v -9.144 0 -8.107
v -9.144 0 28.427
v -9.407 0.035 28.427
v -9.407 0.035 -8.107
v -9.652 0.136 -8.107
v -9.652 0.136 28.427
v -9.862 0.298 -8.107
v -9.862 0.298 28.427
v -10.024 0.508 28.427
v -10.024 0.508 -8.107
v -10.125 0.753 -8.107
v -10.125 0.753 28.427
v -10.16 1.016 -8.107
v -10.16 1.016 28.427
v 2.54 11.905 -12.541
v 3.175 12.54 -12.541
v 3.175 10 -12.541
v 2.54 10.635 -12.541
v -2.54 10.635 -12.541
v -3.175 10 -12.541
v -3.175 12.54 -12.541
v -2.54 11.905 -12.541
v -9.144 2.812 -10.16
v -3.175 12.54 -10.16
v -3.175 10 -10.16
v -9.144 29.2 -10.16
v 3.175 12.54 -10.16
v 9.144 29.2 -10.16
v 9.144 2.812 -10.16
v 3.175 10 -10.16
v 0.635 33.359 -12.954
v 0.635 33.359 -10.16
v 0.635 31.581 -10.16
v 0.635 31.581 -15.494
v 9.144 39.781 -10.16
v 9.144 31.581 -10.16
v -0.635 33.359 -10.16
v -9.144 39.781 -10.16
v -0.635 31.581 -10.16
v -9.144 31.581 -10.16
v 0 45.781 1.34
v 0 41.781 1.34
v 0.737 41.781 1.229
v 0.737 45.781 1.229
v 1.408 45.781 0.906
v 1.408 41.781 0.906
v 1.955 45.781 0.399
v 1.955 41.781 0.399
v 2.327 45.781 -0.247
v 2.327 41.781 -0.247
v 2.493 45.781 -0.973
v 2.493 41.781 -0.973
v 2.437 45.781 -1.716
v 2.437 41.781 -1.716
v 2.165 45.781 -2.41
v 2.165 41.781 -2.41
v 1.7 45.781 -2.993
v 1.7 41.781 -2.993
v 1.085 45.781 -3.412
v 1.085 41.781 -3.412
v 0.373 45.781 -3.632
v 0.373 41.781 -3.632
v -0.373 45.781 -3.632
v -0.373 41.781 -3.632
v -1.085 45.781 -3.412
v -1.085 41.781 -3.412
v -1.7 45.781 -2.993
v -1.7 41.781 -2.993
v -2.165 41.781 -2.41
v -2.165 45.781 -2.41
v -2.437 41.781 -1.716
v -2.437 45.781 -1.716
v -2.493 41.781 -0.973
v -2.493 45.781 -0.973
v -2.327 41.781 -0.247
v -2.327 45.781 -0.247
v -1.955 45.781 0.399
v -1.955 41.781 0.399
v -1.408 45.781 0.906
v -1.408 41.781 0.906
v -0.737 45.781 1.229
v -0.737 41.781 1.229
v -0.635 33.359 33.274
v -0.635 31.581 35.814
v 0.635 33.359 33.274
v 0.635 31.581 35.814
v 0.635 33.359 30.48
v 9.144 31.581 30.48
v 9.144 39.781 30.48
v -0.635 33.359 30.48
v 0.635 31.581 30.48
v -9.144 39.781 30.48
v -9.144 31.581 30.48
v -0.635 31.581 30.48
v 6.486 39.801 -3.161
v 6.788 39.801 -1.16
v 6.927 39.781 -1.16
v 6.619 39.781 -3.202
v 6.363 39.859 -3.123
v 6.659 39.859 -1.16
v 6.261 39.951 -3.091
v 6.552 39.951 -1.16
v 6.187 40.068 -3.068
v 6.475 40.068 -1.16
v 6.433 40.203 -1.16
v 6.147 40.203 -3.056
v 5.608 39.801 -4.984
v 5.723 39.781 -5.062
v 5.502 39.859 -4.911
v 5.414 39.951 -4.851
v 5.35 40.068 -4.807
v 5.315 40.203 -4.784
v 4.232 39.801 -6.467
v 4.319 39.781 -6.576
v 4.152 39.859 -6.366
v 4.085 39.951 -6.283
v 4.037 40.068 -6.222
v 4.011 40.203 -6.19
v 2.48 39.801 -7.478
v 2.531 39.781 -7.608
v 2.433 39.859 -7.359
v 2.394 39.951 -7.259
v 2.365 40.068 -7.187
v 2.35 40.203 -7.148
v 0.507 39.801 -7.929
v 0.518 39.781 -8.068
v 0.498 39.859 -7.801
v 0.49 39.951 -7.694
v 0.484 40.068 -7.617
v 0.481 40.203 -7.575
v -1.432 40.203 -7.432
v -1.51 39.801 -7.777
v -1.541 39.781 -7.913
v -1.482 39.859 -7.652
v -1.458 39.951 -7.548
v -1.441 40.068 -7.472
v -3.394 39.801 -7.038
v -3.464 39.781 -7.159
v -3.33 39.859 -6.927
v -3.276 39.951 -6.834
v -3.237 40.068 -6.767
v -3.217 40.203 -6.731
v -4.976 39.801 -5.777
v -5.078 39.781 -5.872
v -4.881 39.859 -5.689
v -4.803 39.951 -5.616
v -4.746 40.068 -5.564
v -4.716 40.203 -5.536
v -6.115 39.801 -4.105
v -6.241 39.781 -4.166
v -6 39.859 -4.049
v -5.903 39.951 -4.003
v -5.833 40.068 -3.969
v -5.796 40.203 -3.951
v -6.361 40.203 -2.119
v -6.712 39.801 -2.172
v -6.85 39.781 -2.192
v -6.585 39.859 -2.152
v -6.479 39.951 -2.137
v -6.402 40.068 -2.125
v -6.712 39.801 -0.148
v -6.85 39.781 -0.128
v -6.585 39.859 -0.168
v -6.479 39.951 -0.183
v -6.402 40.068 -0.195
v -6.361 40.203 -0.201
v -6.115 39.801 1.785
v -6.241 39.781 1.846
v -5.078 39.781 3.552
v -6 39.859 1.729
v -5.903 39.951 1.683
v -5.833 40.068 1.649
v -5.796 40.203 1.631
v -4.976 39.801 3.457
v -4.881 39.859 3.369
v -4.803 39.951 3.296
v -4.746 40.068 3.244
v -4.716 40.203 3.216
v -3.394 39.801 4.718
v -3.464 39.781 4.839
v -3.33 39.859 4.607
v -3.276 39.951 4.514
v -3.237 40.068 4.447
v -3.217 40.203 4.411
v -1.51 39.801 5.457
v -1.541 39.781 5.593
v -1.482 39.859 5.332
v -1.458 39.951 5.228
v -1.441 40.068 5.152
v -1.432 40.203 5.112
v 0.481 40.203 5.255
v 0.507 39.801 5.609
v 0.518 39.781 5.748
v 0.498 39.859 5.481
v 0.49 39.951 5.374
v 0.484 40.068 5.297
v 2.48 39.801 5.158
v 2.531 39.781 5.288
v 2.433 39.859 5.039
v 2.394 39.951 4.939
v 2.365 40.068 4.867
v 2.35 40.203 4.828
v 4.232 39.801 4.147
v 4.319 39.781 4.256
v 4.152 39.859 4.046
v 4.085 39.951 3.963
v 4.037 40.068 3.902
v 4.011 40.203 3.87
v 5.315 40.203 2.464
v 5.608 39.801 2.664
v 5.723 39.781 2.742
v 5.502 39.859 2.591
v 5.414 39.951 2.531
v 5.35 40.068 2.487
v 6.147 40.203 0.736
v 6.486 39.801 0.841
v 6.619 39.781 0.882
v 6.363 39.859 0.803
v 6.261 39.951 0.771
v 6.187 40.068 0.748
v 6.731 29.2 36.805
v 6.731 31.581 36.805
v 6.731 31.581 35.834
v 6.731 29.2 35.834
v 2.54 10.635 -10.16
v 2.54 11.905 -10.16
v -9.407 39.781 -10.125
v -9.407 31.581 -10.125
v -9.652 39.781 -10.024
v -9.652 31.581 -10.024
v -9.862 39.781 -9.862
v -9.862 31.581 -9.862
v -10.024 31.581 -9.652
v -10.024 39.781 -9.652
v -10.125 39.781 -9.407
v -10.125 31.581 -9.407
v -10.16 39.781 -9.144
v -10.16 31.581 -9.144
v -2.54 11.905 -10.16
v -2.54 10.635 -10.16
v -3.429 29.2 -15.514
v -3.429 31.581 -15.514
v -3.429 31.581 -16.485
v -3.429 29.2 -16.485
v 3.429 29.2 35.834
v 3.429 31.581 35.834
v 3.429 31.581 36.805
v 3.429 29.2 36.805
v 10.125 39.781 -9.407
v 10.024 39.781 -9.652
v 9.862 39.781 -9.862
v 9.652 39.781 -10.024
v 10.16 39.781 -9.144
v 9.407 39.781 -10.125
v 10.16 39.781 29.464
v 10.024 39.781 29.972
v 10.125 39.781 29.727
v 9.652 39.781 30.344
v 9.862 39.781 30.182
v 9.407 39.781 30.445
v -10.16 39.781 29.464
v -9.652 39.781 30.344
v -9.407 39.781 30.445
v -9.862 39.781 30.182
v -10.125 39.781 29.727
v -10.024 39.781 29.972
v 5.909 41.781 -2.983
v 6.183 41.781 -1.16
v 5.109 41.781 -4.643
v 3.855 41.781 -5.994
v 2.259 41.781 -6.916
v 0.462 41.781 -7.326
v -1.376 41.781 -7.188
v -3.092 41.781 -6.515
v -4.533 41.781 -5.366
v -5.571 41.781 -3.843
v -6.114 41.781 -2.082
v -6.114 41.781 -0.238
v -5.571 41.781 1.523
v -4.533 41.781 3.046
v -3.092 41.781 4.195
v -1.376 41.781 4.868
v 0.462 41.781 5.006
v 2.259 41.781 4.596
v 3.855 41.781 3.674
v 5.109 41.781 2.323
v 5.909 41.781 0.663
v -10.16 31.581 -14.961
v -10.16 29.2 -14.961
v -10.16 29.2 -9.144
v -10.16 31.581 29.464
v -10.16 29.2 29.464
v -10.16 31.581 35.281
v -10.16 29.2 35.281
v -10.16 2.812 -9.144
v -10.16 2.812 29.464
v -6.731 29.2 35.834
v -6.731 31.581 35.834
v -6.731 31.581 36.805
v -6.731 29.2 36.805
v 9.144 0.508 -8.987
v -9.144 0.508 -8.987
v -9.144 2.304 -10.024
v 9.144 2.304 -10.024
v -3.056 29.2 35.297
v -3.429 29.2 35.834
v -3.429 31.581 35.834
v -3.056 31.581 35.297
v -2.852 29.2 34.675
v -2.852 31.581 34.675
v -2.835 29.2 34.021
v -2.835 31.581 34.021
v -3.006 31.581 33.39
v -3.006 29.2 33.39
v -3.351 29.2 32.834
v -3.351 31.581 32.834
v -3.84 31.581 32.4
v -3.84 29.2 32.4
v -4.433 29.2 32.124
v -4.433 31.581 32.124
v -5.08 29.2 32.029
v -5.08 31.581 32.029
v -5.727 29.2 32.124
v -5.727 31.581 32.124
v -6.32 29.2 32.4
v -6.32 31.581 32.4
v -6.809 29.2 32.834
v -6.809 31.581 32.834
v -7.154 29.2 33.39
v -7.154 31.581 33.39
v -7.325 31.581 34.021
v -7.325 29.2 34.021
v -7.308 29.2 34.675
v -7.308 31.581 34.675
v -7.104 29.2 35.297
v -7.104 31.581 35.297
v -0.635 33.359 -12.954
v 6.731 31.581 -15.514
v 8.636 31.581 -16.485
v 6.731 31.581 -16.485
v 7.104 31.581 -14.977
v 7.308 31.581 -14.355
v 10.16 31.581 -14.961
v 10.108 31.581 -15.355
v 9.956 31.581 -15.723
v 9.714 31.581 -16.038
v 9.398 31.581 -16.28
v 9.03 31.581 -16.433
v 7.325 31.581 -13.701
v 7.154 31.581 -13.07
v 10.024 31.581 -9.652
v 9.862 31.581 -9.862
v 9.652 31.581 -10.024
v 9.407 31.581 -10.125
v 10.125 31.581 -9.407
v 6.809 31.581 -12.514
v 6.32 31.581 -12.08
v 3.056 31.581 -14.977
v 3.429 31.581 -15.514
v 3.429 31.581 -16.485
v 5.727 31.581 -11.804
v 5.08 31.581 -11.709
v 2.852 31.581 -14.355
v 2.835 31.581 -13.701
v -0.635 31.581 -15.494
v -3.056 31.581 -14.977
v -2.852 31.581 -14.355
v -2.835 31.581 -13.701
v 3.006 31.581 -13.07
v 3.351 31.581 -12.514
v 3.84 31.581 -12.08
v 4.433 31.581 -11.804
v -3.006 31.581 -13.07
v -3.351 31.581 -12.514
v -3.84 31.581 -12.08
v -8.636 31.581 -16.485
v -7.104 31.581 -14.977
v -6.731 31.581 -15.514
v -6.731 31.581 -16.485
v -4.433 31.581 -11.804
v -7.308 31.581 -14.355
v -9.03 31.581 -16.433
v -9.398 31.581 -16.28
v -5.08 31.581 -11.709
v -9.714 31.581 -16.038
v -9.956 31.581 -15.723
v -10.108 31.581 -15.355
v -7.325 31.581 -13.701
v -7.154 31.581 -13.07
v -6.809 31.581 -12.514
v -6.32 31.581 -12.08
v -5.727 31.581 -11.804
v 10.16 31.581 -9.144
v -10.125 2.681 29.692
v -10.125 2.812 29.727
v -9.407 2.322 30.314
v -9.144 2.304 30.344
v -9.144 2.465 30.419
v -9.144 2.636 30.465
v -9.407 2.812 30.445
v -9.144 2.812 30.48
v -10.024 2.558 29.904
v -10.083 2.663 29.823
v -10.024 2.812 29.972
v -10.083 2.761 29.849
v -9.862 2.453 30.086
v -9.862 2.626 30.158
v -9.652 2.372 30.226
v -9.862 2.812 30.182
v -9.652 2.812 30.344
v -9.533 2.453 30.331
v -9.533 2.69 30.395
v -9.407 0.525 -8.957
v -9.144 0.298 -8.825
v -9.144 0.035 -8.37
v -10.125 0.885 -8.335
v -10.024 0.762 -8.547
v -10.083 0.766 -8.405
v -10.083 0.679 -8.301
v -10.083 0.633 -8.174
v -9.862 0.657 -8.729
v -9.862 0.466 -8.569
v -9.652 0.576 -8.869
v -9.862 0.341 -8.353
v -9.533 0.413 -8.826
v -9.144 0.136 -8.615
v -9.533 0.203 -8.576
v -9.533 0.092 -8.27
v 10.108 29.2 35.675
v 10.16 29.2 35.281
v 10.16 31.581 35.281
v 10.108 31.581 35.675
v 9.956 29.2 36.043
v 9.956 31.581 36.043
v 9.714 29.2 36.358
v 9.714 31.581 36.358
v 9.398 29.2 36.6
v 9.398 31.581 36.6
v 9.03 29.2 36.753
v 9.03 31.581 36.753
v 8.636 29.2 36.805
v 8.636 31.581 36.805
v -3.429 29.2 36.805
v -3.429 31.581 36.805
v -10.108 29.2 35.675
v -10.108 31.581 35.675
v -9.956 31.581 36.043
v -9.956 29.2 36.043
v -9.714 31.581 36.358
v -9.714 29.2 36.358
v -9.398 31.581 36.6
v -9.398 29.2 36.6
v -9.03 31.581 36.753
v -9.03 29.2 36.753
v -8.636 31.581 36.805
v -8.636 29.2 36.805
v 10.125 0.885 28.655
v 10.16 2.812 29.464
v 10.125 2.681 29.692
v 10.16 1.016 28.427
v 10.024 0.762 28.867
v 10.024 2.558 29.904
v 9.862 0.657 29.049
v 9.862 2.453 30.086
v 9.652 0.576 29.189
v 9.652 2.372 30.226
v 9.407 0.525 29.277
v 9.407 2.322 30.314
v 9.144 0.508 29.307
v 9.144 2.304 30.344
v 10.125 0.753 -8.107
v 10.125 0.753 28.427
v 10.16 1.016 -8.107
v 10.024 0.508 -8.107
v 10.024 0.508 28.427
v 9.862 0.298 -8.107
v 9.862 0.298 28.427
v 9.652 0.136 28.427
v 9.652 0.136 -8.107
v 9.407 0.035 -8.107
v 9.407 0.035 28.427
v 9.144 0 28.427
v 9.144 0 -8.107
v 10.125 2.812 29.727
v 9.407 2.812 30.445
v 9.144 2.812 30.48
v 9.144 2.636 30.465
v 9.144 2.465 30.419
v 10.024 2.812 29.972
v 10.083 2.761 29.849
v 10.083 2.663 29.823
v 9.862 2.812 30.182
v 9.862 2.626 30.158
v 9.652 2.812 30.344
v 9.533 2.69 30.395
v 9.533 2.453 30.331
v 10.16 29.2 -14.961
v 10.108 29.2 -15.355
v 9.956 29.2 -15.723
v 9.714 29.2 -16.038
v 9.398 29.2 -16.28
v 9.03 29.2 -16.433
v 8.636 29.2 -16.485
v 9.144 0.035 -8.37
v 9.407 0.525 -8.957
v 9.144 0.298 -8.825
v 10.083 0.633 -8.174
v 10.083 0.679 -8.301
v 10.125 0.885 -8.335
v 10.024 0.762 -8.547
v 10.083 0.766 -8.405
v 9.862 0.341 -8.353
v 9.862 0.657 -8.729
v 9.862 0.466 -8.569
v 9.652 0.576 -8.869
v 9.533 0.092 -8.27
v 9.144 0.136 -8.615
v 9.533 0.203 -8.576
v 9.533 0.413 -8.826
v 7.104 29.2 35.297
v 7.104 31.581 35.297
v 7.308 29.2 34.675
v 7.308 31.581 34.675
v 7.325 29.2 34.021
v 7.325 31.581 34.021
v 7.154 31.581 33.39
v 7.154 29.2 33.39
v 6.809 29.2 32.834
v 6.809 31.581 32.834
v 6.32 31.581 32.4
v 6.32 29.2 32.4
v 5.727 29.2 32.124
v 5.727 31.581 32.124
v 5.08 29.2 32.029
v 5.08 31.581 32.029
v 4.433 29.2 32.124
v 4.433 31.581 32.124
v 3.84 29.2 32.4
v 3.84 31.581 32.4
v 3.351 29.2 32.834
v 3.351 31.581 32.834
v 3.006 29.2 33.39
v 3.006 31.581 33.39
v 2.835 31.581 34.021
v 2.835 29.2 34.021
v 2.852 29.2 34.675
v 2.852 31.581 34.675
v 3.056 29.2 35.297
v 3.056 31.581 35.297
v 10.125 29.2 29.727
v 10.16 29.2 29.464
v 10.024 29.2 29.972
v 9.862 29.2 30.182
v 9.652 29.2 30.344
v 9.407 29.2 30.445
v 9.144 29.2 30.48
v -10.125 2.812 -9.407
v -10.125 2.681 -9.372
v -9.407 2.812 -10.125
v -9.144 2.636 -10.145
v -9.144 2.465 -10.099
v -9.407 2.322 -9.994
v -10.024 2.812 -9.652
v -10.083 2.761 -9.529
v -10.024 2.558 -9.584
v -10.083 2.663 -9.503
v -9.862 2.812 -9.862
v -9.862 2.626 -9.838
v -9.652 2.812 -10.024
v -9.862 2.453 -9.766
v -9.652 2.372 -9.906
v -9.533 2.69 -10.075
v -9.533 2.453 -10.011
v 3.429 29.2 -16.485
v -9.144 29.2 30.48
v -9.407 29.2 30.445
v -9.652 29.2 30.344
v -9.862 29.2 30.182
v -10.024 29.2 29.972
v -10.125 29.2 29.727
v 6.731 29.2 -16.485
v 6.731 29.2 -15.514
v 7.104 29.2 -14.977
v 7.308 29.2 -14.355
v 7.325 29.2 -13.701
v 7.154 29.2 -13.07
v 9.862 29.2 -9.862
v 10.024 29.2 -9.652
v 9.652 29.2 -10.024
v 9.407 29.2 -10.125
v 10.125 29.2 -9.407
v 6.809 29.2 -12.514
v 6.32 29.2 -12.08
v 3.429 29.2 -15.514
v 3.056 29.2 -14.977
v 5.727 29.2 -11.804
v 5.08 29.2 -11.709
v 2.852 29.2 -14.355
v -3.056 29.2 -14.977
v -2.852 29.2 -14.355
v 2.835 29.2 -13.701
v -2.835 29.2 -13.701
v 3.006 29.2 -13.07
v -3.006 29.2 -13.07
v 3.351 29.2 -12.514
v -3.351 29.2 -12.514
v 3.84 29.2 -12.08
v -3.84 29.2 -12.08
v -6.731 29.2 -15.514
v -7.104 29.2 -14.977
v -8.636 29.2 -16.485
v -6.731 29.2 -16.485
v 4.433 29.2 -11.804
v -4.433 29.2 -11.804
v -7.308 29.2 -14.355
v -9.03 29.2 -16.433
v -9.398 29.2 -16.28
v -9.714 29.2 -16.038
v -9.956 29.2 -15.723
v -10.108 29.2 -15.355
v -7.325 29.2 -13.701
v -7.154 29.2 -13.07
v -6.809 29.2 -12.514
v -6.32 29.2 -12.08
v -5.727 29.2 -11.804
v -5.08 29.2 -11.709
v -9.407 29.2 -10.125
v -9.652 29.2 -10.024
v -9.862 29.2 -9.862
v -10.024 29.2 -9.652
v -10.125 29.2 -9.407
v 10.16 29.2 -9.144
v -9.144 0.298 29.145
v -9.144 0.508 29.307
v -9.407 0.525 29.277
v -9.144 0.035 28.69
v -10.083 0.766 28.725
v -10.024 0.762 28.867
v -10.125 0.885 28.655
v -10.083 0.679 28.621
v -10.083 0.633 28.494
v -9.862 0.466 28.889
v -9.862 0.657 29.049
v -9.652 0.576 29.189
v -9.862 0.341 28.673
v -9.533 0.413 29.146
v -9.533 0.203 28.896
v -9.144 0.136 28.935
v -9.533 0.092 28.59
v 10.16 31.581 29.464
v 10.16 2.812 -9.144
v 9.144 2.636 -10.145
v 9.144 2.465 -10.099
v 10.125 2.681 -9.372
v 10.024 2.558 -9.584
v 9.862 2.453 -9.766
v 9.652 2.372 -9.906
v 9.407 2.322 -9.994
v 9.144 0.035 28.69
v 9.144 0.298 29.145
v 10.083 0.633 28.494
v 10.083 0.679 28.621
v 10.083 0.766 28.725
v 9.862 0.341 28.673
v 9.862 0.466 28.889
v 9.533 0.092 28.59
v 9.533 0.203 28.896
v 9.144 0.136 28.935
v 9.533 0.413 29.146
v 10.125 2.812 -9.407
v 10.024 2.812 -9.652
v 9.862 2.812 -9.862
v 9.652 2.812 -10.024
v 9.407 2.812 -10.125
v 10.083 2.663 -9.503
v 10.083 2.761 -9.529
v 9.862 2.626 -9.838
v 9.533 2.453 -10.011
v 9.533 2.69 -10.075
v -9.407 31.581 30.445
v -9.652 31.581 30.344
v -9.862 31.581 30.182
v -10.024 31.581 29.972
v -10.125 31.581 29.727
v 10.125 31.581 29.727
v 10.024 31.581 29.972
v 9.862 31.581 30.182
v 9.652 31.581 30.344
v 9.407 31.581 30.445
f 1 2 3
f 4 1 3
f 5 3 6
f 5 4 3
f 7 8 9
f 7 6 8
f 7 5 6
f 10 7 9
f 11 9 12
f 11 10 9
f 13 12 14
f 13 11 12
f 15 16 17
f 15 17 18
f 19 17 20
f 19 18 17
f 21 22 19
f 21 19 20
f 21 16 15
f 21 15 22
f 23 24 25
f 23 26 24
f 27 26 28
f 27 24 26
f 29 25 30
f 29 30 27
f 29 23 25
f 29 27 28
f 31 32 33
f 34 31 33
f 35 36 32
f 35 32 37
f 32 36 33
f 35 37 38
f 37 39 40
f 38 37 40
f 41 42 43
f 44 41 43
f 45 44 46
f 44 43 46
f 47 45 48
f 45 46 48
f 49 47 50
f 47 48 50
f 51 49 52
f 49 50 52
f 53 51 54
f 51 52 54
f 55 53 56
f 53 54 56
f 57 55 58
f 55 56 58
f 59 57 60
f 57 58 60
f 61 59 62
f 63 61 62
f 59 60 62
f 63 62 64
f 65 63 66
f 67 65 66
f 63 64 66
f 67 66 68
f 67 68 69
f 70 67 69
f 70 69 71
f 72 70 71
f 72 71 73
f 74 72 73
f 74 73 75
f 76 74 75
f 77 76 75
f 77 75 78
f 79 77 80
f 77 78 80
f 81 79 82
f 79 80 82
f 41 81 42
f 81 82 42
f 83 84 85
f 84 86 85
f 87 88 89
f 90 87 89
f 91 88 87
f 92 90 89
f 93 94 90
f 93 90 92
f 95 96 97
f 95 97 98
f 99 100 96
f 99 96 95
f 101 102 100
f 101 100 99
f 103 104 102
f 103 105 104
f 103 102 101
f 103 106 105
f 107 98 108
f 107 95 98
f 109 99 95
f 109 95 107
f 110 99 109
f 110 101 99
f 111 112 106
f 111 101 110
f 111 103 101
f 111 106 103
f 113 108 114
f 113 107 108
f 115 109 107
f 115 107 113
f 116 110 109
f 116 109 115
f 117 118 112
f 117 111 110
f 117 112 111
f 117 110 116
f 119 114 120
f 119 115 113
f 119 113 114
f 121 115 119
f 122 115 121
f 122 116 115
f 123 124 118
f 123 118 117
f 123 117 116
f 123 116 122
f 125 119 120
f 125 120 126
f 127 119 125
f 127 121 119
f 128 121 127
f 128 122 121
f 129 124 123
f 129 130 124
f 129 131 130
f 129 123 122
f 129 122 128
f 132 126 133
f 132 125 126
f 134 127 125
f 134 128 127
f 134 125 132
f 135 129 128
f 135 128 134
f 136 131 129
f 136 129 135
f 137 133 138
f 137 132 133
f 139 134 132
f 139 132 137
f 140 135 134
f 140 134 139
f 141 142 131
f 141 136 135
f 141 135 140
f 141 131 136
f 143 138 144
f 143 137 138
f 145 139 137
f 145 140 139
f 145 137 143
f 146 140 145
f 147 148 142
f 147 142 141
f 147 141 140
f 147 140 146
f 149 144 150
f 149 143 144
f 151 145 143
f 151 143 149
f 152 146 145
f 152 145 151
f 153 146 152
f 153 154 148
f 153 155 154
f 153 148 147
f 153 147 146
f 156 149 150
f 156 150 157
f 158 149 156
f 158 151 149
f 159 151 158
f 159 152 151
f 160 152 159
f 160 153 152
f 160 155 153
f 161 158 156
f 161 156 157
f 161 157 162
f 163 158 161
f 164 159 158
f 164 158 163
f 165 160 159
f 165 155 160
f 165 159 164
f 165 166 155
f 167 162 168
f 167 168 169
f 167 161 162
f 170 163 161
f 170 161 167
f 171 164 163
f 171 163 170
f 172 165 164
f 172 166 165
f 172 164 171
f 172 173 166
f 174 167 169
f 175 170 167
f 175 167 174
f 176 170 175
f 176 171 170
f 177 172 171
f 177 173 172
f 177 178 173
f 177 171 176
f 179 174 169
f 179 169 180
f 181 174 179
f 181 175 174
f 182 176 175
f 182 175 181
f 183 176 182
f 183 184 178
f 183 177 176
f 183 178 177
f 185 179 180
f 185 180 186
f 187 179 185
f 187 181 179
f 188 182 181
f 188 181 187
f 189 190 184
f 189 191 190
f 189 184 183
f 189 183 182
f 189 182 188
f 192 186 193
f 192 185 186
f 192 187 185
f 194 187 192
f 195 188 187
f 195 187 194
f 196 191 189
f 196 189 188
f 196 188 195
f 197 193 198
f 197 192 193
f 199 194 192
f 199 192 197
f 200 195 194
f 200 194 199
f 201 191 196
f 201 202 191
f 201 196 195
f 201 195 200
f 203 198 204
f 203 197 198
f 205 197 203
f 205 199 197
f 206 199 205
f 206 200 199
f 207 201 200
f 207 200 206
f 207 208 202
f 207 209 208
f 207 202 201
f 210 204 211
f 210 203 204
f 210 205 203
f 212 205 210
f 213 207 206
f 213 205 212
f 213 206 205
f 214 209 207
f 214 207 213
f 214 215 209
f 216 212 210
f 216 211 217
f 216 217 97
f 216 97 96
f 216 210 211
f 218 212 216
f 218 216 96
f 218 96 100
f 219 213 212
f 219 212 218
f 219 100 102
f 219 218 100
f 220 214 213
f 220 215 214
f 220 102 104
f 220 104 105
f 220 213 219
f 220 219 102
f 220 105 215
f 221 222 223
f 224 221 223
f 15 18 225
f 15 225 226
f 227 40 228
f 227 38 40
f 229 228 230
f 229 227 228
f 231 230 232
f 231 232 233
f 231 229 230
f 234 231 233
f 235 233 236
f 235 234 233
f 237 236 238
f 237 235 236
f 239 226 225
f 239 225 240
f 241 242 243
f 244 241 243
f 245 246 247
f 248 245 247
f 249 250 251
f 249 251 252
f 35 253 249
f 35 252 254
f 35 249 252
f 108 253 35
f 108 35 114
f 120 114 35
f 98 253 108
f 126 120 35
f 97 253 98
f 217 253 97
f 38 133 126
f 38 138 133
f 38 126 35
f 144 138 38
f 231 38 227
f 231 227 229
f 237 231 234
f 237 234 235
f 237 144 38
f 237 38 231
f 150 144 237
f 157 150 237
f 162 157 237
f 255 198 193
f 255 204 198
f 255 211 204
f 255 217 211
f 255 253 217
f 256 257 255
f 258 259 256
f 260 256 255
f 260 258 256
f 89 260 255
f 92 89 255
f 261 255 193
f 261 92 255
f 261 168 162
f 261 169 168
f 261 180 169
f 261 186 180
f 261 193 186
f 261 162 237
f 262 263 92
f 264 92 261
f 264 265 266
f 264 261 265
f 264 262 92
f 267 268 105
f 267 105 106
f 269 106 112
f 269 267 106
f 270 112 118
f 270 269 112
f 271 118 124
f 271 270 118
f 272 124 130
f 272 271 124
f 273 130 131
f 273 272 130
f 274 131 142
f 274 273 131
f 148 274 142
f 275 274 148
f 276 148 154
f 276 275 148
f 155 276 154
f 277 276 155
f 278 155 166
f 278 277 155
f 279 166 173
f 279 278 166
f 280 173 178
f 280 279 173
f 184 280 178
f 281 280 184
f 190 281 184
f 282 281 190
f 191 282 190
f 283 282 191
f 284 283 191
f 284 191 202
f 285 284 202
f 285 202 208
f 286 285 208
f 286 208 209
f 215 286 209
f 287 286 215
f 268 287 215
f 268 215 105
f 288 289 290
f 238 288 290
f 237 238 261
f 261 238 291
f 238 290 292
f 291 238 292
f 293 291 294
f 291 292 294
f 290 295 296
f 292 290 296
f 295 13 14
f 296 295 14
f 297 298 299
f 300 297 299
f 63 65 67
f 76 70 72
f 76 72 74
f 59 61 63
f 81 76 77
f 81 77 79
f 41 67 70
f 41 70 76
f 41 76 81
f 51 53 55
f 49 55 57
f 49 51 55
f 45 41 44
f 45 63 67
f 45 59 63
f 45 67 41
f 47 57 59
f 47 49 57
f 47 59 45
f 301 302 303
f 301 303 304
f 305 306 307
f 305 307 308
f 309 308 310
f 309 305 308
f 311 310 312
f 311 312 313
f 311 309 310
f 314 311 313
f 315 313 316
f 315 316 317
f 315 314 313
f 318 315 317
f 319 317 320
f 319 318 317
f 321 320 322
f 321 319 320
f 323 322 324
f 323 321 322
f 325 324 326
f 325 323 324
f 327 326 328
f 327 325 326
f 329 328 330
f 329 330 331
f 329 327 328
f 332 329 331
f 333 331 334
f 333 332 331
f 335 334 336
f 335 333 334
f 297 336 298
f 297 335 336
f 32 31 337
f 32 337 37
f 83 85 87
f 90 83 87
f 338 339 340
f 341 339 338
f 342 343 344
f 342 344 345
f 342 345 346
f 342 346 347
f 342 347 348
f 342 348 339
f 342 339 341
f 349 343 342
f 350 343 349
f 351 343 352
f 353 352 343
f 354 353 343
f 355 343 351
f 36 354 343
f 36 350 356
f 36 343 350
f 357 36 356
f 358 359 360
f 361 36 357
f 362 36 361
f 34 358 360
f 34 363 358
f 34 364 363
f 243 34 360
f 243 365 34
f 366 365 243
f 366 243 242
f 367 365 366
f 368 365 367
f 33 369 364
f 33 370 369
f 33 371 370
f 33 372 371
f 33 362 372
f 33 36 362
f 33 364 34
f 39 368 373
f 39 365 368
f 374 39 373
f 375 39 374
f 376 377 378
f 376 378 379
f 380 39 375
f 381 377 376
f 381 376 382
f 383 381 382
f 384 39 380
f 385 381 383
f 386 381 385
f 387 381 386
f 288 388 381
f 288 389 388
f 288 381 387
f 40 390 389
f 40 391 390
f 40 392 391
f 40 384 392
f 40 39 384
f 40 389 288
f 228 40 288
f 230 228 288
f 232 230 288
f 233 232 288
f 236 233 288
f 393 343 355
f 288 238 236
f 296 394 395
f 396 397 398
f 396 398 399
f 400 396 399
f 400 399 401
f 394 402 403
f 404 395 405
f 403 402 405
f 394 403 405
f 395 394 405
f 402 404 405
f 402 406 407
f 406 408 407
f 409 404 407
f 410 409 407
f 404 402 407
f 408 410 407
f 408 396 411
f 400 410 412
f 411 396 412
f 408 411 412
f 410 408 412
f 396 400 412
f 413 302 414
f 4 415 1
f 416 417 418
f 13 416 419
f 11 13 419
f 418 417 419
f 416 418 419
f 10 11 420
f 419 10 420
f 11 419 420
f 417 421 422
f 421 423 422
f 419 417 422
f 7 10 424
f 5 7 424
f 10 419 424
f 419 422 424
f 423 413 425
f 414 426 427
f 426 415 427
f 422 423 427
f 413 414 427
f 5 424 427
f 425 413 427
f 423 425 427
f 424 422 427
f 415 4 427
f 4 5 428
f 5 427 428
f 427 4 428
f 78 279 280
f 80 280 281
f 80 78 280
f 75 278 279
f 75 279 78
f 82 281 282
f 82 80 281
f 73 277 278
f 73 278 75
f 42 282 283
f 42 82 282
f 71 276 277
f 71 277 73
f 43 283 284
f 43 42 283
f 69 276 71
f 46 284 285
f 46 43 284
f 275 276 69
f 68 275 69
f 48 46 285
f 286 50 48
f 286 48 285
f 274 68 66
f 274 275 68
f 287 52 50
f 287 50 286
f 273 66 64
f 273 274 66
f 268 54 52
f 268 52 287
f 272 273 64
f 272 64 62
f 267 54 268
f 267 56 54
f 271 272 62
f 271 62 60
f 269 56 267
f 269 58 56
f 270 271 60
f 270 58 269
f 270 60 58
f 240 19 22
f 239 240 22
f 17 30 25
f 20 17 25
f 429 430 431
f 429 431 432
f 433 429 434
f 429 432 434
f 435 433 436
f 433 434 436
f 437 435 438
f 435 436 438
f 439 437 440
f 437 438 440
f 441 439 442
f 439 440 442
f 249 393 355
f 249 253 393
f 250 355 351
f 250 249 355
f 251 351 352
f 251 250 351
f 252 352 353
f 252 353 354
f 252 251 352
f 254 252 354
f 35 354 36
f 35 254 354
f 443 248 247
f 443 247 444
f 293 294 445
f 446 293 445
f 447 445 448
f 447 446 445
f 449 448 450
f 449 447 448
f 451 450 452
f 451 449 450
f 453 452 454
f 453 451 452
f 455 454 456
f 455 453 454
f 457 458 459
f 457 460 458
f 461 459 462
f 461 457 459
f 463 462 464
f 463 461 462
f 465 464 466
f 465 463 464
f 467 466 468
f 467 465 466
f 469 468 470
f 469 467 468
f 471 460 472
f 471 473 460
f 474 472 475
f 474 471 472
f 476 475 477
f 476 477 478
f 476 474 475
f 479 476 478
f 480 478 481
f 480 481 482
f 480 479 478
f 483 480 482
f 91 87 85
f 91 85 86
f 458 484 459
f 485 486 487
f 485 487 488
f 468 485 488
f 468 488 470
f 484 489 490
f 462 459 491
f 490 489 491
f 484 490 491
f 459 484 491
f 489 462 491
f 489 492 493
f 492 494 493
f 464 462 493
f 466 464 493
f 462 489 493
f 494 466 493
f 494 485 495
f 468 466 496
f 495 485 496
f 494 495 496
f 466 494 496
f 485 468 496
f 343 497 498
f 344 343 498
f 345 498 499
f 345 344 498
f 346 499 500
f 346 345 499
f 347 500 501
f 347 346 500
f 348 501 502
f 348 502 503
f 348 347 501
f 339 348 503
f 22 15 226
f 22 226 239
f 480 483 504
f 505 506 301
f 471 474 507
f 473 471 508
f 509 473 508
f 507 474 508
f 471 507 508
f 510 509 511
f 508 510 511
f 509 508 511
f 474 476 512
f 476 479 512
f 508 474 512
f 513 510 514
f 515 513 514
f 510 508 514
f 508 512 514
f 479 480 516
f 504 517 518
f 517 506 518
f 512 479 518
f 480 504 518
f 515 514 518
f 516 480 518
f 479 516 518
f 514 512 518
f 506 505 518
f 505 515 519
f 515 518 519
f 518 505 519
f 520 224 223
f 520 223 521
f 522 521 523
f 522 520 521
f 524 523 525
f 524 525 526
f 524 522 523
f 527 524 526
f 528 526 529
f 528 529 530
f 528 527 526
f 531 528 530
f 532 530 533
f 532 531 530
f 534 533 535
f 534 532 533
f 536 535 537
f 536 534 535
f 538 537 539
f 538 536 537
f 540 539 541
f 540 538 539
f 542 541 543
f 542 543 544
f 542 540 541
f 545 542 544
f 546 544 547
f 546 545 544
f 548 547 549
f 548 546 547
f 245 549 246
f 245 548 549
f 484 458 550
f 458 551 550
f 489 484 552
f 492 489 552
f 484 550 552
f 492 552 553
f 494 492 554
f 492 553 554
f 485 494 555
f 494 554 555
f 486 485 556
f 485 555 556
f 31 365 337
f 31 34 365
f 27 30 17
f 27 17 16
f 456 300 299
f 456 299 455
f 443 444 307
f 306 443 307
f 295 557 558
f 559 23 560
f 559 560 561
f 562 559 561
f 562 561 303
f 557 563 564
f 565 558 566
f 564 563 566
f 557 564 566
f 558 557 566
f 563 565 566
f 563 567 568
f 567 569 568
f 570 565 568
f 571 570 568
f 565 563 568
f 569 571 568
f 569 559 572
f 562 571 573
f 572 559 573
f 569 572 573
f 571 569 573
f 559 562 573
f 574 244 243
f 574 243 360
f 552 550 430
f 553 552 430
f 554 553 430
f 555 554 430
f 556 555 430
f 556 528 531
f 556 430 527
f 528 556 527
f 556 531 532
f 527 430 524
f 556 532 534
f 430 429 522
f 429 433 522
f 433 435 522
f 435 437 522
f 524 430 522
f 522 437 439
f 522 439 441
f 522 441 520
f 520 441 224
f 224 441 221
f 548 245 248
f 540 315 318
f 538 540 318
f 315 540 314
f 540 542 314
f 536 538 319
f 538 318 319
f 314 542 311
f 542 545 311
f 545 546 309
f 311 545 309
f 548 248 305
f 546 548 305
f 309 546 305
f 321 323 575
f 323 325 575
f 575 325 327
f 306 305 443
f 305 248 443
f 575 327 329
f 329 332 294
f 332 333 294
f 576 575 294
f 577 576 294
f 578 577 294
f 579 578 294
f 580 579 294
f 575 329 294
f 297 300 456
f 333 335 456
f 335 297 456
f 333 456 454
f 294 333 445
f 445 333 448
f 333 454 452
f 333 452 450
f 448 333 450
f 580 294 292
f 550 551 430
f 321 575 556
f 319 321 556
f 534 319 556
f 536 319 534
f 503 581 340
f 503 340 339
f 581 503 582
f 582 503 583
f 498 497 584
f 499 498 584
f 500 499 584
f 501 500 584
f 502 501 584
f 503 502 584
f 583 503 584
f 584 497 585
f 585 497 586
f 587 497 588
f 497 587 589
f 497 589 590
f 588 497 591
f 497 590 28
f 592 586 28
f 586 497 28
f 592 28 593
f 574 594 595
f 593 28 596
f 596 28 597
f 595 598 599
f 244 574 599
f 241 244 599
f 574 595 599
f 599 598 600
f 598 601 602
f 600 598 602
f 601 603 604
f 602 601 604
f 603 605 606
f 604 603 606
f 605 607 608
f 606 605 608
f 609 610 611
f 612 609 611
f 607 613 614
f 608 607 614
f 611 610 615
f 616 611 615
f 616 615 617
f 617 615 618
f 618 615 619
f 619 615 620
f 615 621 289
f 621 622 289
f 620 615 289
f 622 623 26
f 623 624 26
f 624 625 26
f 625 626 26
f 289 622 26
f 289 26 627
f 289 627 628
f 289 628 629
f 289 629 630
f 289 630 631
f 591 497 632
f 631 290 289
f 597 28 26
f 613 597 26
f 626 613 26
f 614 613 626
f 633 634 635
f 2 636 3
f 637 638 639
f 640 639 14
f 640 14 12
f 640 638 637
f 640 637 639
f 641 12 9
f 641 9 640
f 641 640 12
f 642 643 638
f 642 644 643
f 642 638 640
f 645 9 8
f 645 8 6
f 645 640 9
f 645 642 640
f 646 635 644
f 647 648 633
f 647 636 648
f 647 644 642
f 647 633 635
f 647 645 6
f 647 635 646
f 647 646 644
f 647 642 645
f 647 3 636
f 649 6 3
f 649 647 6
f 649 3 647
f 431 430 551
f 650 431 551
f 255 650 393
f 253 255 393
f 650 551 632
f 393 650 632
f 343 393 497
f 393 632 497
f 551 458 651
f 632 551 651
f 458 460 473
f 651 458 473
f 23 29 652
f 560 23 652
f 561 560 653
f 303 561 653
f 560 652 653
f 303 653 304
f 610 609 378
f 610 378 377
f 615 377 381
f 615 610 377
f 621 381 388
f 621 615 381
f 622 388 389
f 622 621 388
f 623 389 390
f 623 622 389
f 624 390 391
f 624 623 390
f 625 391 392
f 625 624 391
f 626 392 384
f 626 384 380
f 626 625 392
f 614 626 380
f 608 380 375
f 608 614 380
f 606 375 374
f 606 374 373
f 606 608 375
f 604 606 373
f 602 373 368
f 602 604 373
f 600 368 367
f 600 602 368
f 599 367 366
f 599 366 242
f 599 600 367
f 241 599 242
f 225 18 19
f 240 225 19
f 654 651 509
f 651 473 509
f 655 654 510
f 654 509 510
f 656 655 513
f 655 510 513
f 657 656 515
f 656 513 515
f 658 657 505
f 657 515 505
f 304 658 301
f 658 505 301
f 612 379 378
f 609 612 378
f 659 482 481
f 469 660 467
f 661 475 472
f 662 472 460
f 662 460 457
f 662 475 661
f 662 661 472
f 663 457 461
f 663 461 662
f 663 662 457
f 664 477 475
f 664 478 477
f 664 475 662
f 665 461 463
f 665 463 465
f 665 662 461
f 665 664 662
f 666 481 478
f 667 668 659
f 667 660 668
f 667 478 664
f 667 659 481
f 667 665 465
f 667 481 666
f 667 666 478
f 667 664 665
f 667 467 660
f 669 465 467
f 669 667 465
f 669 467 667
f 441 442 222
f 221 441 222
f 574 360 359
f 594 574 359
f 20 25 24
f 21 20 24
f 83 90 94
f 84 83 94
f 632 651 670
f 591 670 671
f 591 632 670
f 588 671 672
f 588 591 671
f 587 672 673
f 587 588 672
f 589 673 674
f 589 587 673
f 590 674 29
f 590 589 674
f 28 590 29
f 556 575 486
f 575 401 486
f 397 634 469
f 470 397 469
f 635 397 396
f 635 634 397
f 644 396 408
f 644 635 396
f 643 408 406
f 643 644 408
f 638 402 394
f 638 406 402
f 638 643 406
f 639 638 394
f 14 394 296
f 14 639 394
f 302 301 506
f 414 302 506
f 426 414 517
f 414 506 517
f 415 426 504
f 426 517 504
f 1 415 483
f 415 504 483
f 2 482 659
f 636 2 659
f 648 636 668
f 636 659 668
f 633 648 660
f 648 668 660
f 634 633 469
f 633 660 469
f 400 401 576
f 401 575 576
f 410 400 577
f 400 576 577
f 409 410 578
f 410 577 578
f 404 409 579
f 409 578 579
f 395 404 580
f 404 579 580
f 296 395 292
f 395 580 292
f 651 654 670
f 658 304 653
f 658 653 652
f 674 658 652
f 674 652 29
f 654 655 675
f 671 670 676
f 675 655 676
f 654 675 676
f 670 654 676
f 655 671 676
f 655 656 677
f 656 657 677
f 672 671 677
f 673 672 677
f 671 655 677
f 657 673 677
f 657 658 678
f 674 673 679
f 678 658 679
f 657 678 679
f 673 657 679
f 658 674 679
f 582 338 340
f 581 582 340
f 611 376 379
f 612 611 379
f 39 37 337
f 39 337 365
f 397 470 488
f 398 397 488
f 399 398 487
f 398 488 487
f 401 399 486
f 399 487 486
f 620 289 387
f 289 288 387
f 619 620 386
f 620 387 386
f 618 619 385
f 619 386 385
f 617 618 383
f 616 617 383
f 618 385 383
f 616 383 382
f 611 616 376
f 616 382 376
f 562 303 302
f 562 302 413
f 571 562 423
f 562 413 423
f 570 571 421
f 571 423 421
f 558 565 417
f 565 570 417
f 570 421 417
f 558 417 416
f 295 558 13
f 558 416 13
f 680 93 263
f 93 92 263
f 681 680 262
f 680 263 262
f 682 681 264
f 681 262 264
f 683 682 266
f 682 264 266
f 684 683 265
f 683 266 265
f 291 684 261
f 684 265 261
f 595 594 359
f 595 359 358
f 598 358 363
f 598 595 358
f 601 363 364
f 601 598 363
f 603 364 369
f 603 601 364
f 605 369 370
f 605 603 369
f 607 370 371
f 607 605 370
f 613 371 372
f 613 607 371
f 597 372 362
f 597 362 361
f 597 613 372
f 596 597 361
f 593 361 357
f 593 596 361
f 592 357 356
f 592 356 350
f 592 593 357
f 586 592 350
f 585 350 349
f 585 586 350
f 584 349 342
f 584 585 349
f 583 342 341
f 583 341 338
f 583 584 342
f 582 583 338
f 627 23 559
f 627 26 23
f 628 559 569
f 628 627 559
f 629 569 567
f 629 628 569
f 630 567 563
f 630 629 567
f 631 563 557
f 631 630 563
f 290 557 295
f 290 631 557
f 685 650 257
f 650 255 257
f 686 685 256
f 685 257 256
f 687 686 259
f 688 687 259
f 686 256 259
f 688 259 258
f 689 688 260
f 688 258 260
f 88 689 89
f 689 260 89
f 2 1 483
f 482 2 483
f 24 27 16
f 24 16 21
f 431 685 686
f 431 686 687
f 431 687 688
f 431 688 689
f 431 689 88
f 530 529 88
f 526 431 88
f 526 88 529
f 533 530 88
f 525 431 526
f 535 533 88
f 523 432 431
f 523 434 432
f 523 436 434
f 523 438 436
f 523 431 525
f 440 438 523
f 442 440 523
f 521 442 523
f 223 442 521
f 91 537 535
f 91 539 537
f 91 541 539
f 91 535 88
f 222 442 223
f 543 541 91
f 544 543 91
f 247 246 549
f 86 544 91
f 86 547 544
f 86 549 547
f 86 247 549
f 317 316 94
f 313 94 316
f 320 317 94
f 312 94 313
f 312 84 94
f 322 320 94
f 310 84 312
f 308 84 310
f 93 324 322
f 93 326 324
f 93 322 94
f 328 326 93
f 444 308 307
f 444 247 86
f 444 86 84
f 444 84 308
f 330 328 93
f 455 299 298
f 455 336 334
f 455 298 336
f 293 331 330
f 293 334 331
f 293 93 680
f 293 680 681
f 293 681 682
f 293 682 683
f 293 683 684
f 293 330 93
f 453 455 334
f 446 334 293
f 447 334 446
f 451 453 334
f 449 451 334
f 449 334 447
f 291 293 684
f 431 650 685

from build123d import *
from OCP.BRepFilletAPI import BRepFilletAPI_MakeChamfer

# Parameters (mm, degrees)
SKETCH1_W          = 20.32
SKETCH1_H          = 40.64
EXTRUDE1_DEPTH     = 29.2
SKETCH2_W          = 20.32
SKETCH2_H          = 40.64
EXTRUDE2_DEPTH     = 2.38125
SKETCH3_W          = 20.32
SKETCH3_H          = 40.64
EXTRUDE3_DEPTH     = 8.2
EXTRUDE6_DEPTH     = 0.635
CHAMFER2_SIZE      = 2.54
CHAMFER2_SIZE2     = 1.466469684
FILLET1_R          = 1.016
FILLET2_R          = 1.524
SKETCH9_W          = 6.35
SKETCH9_H          = 2.54
EXTRUDE8_DEPTH     = 2.38125
SKETCH10_W         = 5.08
SKETCH10_H         = 1.27
CUT_EXTRUDE1_DEPTH = 2.38125
SKETCH_1_R         = 6.5
EXTRUDE_1_DEPTH    = 2
EXTRUDE_1_TAPER    = 9
FILLET_1_R         = 0.5
SKETCH_2_R         = 2.5
EXTRUDE_2_DEPTH    = 4


with BuildPart() as part:
    # Sketch1 → Extrude1 (new body)
    with BuildSketch(Plane(origin=(0, 0, 0), x_dir=(1, 0, 0), z_dir=(0, 1, 0))):
        with Locations((0, -10.16)):
            Rectangle(SKETCH1_W, SKETCH1_H)
    extrude(amount=EXTRUDE1_DEPTH)

    # Sketch2 → Extrude2 (add)
    with BuildSketch(Plane(origin=(0, 29.2, 0), x_dir=(-1, 0, 0), z_dir=(0, 1, 0))):
        with Locations((0, 10.16)):
            Rectangle(SKETCH2_W, SKETCH2_H)
        with BuildLine():
            ThreePointArc((6.731, -15.51418631), (5.08, -11.7094), (3.429, -15.51418631))
            Line((3.429, -15.51418631), (3.429, -16.4846))
            Line((3.429, -16.4846), (-3.429, -16.4846))
            Line((-3.429, -16.4846), (-3.429, -15.51418631))
            ThreePointArc((-3.429, -15.51418631), (-5.08, -11.7094), (-6.731, -15.51418631))
            Line((-6.731, -15.51418631), (-6.731, -16.4846))
            Line((-6.731, -16.4846), (-10.16, -16.4846))
            Line((-10.16, -16.4846), (-10.16, -10.16))
            Line((-10.16, -10.16), (10.16, -10.16))
            Line((10.16, -10.16), (10.16, -16.4846))
            Line((10.16, -16.4846), (6.731, -16.4846))
            Line((6.731, -16.4846), (6.731, -15.51418631))
        make_face()
        with BuildLine():
            ThreePointArc((-6.731, 35.83418631), (-5.08, 32.0294), (-3.429, 35.83418631))
            Line((-3.429, 35.83418631), (-3.429, 36.8046))
            Line((-3.429, 36.8046), (3.429, 36.8046))
            Line((3.429, 36.8046), (3.429, 35.83418631))
            ThreePointArc((3.429, 35.83418631), (5.08, 32.0294), (6.731, 35.83418631))
            Line((6.731, 35.83418631), (6.731, 36.8046))
            Line((6.731, 36.8046), (10.16, 36.8046))
            Line((10.16, 36.8046), (10.16, 30.48))
            Line((10.16, 30.48), (-10.16, 30.48))
            Line((-10.16, 30.48), (-10.16, 36.8046))
            Line((-10.16, 36.8046), (-6.731, 36.8046))
            Line((-6.731, 36.8046), (-6.731, 35.83418631))
        make_face()
    extrude(amount=EXTRUDE2_DEPTH)

    # Sketch3 → Extrude3 (add)
    with BuildSketch(Plane(origin=(0, 31.58125, 0), x_dir=(-1, 0, 0), z_dir=(0, 1, 0))):
        with Locations((0, 10.16)):
            Rectangle(SKETCH3_W, SKETCH3_H)
    extrude(amount=EXTRUDE3_DEPTH)

    # Sketch7 → Extrude6 (add, symmetric)
    with BuildSketch(Plane(origin=(0, 0, 0), x_dir=(0, 0, -1), z_dir=(1, 0, 0))):
        Polygon((15.494, 31.58125), (12.954, 33.35925), (10.16, 33.35925), (10.16, 31.58125), align=None)
    extrude6 = extrude(amount=EXTRUDE6_DEPTH, both=True)

    # Mirror1: Extrude6 across plane
    add(extrude6.mirror(Plane(origin=(0, 0, 10.16), x_dir=(1, 0, 0), z_dir=(0, 0, -1))))

    # Chamfer2: one chamfer whose edges measure the first distance from different faces: ONE call of the kernel's chamfer builder (chamfer() names one face for all edges)
    chamfer2_edges_1 = [part.edges().sort_by_distance(p)[0] for p in [
        (0, 0, -10.16),
    ]]
    chamfer2_side_1 = [part.faces().sort_by_distance(p)[0] for p in [
        (0, 14.6, -10.16),
    ]]
    chamfer2_edges_2 = [part.edges().sort_by_distance(p)[0] for p in [
        (0, 0, 30.48),
    ]]
    chamfer2_side_2 = [part.faces().sort_by_distance(p)[0] for p in [
        (0, 14.6, 30.48),
    ]]
    chamfer2 = BRepFilletAPI_MakeChamfer(part.part.solid().wrapped)
    for e in chamfer2_edges_1:
        chamfer2.Add(CHAMFER2_SIZE, CHAMFER2_SIZE2, e.wrapped, chamfer2_side_1[0].wrapped)  # the first distance lies on this face
    for e in chamfer2_edges_2:
        chamfer2.Add(CHAMFER2_SIZE, CHAMFER2_SIZE2, e.wrapped, chamfer2_side_2[0].wrapped)  # the first distance lies on this face
    add(Compound.cast(chamfer2.Shape()), mode=Mode.REPLACE)

    # Fillet1
    fillet1_edges = [part.edges().sort_by_distance(p)[0] for p in [
        (-10.16, 35.68125, -10.16),
        (10.16, 35.68125, -10.16),
        (10.16, 35.68125, 30.48),
        (10.16, 0, 10.16),
        (10.16, 1.27, -9.426765158),
        (10.16, 15.87, -10.16),
        (0, 0, -8.693530316),
        (0, 2.54, -10.16),
        (-10.16, 15.87, -10.16),
        (-10.16, 1.27, -9.426765158),
        (10.16, 15.87, 30.48),
        (10.16, 1.27, 29.746765158),
        (0, 2.54, 30.48),
        (-10.16, 0, 10.16),
        (0, 0, 29.013530316),
        (-10.16, 1.27, 29.746765158),
        (-10.16, 15.87, 30.48),
        (-10.16, 35.68125, 30.48),
    ]]
    fillet(fillet1_edges, radius=FILLET1_R)

    # Fillet2
    fillet2_edges = [part.edges().sort_by_distance(p)[0] for p in [
        (-10.16, 30.390625, 36.8046),
        (10.16, 30.390625, 36.8046),
        (-10.16, 30.390625, -16.4846),
        (10.16, 30.390625, -16.4846),
    ]]
    fillet(fillet2_edges, radius=FILLET2_R)

    # Sketch9 → Extrude8 (add)
    with BuildSketch(Plane(origin=(0, 0, -10.16), x_dir=(-1, 0, 0), z_dir=(0, 0, -1))):
        with Locations((0, 11.27)):
            Rectangle(SKETCH9_W, SKETCH9_H)
    extrude(amount=EXTRUDE8_DEPTH)

    # Sketch10 → Cut-Extrude1 (cut)
    with BuildSketch(Plane(origin=(0, 0, -12.54125), x_dir=(-1, 0, 0), z_dir=(0, 0, -1))):
        with Locations((0, 11.27)):
            Rectangle(SKETCH10_W, SKETCH10_H)
    extrude(amount=-CUT_EXTRUDE1_DEPTH, mode=Mode.SUBTRACT)

    # Эскиз1 → Вытянуть1 (add)
    with BuildSketch(Plane(origin=(0, 39.78125, 0), x_dir=(1, 0, 0), z_dir=(0, 1, 0))):
        with Locations((0, 1.16)):
            Circle(SKETCH_1_R)
    extrude(amount=EXTRUDE_1_DEPTH, taper=EXTRUDE_1_TAPER)

    # Скругление1
    fillet_1_edges = [part.edges().sort_by_distance(p)[0] for p in [
        (-6.5, 39.78125, -1.16),
    ]]
    fillet(fillet_1_edges, radius=FILLET_1_R)

    # Эскиз2 → Вытянуть2 (add)
    with BuildSketch(Plane(origin=(0, 41.78125, 0), x_dir=(1, 0, 0), z_dir=(0, 1, 0))):
        with Locations(Location((0, 1.16, 0), (0, 0, 270))):
            Circle(SKETCH_2_R)
    extrude(amount=EXTRUDE_2_DEPTH)


solid = part.part
